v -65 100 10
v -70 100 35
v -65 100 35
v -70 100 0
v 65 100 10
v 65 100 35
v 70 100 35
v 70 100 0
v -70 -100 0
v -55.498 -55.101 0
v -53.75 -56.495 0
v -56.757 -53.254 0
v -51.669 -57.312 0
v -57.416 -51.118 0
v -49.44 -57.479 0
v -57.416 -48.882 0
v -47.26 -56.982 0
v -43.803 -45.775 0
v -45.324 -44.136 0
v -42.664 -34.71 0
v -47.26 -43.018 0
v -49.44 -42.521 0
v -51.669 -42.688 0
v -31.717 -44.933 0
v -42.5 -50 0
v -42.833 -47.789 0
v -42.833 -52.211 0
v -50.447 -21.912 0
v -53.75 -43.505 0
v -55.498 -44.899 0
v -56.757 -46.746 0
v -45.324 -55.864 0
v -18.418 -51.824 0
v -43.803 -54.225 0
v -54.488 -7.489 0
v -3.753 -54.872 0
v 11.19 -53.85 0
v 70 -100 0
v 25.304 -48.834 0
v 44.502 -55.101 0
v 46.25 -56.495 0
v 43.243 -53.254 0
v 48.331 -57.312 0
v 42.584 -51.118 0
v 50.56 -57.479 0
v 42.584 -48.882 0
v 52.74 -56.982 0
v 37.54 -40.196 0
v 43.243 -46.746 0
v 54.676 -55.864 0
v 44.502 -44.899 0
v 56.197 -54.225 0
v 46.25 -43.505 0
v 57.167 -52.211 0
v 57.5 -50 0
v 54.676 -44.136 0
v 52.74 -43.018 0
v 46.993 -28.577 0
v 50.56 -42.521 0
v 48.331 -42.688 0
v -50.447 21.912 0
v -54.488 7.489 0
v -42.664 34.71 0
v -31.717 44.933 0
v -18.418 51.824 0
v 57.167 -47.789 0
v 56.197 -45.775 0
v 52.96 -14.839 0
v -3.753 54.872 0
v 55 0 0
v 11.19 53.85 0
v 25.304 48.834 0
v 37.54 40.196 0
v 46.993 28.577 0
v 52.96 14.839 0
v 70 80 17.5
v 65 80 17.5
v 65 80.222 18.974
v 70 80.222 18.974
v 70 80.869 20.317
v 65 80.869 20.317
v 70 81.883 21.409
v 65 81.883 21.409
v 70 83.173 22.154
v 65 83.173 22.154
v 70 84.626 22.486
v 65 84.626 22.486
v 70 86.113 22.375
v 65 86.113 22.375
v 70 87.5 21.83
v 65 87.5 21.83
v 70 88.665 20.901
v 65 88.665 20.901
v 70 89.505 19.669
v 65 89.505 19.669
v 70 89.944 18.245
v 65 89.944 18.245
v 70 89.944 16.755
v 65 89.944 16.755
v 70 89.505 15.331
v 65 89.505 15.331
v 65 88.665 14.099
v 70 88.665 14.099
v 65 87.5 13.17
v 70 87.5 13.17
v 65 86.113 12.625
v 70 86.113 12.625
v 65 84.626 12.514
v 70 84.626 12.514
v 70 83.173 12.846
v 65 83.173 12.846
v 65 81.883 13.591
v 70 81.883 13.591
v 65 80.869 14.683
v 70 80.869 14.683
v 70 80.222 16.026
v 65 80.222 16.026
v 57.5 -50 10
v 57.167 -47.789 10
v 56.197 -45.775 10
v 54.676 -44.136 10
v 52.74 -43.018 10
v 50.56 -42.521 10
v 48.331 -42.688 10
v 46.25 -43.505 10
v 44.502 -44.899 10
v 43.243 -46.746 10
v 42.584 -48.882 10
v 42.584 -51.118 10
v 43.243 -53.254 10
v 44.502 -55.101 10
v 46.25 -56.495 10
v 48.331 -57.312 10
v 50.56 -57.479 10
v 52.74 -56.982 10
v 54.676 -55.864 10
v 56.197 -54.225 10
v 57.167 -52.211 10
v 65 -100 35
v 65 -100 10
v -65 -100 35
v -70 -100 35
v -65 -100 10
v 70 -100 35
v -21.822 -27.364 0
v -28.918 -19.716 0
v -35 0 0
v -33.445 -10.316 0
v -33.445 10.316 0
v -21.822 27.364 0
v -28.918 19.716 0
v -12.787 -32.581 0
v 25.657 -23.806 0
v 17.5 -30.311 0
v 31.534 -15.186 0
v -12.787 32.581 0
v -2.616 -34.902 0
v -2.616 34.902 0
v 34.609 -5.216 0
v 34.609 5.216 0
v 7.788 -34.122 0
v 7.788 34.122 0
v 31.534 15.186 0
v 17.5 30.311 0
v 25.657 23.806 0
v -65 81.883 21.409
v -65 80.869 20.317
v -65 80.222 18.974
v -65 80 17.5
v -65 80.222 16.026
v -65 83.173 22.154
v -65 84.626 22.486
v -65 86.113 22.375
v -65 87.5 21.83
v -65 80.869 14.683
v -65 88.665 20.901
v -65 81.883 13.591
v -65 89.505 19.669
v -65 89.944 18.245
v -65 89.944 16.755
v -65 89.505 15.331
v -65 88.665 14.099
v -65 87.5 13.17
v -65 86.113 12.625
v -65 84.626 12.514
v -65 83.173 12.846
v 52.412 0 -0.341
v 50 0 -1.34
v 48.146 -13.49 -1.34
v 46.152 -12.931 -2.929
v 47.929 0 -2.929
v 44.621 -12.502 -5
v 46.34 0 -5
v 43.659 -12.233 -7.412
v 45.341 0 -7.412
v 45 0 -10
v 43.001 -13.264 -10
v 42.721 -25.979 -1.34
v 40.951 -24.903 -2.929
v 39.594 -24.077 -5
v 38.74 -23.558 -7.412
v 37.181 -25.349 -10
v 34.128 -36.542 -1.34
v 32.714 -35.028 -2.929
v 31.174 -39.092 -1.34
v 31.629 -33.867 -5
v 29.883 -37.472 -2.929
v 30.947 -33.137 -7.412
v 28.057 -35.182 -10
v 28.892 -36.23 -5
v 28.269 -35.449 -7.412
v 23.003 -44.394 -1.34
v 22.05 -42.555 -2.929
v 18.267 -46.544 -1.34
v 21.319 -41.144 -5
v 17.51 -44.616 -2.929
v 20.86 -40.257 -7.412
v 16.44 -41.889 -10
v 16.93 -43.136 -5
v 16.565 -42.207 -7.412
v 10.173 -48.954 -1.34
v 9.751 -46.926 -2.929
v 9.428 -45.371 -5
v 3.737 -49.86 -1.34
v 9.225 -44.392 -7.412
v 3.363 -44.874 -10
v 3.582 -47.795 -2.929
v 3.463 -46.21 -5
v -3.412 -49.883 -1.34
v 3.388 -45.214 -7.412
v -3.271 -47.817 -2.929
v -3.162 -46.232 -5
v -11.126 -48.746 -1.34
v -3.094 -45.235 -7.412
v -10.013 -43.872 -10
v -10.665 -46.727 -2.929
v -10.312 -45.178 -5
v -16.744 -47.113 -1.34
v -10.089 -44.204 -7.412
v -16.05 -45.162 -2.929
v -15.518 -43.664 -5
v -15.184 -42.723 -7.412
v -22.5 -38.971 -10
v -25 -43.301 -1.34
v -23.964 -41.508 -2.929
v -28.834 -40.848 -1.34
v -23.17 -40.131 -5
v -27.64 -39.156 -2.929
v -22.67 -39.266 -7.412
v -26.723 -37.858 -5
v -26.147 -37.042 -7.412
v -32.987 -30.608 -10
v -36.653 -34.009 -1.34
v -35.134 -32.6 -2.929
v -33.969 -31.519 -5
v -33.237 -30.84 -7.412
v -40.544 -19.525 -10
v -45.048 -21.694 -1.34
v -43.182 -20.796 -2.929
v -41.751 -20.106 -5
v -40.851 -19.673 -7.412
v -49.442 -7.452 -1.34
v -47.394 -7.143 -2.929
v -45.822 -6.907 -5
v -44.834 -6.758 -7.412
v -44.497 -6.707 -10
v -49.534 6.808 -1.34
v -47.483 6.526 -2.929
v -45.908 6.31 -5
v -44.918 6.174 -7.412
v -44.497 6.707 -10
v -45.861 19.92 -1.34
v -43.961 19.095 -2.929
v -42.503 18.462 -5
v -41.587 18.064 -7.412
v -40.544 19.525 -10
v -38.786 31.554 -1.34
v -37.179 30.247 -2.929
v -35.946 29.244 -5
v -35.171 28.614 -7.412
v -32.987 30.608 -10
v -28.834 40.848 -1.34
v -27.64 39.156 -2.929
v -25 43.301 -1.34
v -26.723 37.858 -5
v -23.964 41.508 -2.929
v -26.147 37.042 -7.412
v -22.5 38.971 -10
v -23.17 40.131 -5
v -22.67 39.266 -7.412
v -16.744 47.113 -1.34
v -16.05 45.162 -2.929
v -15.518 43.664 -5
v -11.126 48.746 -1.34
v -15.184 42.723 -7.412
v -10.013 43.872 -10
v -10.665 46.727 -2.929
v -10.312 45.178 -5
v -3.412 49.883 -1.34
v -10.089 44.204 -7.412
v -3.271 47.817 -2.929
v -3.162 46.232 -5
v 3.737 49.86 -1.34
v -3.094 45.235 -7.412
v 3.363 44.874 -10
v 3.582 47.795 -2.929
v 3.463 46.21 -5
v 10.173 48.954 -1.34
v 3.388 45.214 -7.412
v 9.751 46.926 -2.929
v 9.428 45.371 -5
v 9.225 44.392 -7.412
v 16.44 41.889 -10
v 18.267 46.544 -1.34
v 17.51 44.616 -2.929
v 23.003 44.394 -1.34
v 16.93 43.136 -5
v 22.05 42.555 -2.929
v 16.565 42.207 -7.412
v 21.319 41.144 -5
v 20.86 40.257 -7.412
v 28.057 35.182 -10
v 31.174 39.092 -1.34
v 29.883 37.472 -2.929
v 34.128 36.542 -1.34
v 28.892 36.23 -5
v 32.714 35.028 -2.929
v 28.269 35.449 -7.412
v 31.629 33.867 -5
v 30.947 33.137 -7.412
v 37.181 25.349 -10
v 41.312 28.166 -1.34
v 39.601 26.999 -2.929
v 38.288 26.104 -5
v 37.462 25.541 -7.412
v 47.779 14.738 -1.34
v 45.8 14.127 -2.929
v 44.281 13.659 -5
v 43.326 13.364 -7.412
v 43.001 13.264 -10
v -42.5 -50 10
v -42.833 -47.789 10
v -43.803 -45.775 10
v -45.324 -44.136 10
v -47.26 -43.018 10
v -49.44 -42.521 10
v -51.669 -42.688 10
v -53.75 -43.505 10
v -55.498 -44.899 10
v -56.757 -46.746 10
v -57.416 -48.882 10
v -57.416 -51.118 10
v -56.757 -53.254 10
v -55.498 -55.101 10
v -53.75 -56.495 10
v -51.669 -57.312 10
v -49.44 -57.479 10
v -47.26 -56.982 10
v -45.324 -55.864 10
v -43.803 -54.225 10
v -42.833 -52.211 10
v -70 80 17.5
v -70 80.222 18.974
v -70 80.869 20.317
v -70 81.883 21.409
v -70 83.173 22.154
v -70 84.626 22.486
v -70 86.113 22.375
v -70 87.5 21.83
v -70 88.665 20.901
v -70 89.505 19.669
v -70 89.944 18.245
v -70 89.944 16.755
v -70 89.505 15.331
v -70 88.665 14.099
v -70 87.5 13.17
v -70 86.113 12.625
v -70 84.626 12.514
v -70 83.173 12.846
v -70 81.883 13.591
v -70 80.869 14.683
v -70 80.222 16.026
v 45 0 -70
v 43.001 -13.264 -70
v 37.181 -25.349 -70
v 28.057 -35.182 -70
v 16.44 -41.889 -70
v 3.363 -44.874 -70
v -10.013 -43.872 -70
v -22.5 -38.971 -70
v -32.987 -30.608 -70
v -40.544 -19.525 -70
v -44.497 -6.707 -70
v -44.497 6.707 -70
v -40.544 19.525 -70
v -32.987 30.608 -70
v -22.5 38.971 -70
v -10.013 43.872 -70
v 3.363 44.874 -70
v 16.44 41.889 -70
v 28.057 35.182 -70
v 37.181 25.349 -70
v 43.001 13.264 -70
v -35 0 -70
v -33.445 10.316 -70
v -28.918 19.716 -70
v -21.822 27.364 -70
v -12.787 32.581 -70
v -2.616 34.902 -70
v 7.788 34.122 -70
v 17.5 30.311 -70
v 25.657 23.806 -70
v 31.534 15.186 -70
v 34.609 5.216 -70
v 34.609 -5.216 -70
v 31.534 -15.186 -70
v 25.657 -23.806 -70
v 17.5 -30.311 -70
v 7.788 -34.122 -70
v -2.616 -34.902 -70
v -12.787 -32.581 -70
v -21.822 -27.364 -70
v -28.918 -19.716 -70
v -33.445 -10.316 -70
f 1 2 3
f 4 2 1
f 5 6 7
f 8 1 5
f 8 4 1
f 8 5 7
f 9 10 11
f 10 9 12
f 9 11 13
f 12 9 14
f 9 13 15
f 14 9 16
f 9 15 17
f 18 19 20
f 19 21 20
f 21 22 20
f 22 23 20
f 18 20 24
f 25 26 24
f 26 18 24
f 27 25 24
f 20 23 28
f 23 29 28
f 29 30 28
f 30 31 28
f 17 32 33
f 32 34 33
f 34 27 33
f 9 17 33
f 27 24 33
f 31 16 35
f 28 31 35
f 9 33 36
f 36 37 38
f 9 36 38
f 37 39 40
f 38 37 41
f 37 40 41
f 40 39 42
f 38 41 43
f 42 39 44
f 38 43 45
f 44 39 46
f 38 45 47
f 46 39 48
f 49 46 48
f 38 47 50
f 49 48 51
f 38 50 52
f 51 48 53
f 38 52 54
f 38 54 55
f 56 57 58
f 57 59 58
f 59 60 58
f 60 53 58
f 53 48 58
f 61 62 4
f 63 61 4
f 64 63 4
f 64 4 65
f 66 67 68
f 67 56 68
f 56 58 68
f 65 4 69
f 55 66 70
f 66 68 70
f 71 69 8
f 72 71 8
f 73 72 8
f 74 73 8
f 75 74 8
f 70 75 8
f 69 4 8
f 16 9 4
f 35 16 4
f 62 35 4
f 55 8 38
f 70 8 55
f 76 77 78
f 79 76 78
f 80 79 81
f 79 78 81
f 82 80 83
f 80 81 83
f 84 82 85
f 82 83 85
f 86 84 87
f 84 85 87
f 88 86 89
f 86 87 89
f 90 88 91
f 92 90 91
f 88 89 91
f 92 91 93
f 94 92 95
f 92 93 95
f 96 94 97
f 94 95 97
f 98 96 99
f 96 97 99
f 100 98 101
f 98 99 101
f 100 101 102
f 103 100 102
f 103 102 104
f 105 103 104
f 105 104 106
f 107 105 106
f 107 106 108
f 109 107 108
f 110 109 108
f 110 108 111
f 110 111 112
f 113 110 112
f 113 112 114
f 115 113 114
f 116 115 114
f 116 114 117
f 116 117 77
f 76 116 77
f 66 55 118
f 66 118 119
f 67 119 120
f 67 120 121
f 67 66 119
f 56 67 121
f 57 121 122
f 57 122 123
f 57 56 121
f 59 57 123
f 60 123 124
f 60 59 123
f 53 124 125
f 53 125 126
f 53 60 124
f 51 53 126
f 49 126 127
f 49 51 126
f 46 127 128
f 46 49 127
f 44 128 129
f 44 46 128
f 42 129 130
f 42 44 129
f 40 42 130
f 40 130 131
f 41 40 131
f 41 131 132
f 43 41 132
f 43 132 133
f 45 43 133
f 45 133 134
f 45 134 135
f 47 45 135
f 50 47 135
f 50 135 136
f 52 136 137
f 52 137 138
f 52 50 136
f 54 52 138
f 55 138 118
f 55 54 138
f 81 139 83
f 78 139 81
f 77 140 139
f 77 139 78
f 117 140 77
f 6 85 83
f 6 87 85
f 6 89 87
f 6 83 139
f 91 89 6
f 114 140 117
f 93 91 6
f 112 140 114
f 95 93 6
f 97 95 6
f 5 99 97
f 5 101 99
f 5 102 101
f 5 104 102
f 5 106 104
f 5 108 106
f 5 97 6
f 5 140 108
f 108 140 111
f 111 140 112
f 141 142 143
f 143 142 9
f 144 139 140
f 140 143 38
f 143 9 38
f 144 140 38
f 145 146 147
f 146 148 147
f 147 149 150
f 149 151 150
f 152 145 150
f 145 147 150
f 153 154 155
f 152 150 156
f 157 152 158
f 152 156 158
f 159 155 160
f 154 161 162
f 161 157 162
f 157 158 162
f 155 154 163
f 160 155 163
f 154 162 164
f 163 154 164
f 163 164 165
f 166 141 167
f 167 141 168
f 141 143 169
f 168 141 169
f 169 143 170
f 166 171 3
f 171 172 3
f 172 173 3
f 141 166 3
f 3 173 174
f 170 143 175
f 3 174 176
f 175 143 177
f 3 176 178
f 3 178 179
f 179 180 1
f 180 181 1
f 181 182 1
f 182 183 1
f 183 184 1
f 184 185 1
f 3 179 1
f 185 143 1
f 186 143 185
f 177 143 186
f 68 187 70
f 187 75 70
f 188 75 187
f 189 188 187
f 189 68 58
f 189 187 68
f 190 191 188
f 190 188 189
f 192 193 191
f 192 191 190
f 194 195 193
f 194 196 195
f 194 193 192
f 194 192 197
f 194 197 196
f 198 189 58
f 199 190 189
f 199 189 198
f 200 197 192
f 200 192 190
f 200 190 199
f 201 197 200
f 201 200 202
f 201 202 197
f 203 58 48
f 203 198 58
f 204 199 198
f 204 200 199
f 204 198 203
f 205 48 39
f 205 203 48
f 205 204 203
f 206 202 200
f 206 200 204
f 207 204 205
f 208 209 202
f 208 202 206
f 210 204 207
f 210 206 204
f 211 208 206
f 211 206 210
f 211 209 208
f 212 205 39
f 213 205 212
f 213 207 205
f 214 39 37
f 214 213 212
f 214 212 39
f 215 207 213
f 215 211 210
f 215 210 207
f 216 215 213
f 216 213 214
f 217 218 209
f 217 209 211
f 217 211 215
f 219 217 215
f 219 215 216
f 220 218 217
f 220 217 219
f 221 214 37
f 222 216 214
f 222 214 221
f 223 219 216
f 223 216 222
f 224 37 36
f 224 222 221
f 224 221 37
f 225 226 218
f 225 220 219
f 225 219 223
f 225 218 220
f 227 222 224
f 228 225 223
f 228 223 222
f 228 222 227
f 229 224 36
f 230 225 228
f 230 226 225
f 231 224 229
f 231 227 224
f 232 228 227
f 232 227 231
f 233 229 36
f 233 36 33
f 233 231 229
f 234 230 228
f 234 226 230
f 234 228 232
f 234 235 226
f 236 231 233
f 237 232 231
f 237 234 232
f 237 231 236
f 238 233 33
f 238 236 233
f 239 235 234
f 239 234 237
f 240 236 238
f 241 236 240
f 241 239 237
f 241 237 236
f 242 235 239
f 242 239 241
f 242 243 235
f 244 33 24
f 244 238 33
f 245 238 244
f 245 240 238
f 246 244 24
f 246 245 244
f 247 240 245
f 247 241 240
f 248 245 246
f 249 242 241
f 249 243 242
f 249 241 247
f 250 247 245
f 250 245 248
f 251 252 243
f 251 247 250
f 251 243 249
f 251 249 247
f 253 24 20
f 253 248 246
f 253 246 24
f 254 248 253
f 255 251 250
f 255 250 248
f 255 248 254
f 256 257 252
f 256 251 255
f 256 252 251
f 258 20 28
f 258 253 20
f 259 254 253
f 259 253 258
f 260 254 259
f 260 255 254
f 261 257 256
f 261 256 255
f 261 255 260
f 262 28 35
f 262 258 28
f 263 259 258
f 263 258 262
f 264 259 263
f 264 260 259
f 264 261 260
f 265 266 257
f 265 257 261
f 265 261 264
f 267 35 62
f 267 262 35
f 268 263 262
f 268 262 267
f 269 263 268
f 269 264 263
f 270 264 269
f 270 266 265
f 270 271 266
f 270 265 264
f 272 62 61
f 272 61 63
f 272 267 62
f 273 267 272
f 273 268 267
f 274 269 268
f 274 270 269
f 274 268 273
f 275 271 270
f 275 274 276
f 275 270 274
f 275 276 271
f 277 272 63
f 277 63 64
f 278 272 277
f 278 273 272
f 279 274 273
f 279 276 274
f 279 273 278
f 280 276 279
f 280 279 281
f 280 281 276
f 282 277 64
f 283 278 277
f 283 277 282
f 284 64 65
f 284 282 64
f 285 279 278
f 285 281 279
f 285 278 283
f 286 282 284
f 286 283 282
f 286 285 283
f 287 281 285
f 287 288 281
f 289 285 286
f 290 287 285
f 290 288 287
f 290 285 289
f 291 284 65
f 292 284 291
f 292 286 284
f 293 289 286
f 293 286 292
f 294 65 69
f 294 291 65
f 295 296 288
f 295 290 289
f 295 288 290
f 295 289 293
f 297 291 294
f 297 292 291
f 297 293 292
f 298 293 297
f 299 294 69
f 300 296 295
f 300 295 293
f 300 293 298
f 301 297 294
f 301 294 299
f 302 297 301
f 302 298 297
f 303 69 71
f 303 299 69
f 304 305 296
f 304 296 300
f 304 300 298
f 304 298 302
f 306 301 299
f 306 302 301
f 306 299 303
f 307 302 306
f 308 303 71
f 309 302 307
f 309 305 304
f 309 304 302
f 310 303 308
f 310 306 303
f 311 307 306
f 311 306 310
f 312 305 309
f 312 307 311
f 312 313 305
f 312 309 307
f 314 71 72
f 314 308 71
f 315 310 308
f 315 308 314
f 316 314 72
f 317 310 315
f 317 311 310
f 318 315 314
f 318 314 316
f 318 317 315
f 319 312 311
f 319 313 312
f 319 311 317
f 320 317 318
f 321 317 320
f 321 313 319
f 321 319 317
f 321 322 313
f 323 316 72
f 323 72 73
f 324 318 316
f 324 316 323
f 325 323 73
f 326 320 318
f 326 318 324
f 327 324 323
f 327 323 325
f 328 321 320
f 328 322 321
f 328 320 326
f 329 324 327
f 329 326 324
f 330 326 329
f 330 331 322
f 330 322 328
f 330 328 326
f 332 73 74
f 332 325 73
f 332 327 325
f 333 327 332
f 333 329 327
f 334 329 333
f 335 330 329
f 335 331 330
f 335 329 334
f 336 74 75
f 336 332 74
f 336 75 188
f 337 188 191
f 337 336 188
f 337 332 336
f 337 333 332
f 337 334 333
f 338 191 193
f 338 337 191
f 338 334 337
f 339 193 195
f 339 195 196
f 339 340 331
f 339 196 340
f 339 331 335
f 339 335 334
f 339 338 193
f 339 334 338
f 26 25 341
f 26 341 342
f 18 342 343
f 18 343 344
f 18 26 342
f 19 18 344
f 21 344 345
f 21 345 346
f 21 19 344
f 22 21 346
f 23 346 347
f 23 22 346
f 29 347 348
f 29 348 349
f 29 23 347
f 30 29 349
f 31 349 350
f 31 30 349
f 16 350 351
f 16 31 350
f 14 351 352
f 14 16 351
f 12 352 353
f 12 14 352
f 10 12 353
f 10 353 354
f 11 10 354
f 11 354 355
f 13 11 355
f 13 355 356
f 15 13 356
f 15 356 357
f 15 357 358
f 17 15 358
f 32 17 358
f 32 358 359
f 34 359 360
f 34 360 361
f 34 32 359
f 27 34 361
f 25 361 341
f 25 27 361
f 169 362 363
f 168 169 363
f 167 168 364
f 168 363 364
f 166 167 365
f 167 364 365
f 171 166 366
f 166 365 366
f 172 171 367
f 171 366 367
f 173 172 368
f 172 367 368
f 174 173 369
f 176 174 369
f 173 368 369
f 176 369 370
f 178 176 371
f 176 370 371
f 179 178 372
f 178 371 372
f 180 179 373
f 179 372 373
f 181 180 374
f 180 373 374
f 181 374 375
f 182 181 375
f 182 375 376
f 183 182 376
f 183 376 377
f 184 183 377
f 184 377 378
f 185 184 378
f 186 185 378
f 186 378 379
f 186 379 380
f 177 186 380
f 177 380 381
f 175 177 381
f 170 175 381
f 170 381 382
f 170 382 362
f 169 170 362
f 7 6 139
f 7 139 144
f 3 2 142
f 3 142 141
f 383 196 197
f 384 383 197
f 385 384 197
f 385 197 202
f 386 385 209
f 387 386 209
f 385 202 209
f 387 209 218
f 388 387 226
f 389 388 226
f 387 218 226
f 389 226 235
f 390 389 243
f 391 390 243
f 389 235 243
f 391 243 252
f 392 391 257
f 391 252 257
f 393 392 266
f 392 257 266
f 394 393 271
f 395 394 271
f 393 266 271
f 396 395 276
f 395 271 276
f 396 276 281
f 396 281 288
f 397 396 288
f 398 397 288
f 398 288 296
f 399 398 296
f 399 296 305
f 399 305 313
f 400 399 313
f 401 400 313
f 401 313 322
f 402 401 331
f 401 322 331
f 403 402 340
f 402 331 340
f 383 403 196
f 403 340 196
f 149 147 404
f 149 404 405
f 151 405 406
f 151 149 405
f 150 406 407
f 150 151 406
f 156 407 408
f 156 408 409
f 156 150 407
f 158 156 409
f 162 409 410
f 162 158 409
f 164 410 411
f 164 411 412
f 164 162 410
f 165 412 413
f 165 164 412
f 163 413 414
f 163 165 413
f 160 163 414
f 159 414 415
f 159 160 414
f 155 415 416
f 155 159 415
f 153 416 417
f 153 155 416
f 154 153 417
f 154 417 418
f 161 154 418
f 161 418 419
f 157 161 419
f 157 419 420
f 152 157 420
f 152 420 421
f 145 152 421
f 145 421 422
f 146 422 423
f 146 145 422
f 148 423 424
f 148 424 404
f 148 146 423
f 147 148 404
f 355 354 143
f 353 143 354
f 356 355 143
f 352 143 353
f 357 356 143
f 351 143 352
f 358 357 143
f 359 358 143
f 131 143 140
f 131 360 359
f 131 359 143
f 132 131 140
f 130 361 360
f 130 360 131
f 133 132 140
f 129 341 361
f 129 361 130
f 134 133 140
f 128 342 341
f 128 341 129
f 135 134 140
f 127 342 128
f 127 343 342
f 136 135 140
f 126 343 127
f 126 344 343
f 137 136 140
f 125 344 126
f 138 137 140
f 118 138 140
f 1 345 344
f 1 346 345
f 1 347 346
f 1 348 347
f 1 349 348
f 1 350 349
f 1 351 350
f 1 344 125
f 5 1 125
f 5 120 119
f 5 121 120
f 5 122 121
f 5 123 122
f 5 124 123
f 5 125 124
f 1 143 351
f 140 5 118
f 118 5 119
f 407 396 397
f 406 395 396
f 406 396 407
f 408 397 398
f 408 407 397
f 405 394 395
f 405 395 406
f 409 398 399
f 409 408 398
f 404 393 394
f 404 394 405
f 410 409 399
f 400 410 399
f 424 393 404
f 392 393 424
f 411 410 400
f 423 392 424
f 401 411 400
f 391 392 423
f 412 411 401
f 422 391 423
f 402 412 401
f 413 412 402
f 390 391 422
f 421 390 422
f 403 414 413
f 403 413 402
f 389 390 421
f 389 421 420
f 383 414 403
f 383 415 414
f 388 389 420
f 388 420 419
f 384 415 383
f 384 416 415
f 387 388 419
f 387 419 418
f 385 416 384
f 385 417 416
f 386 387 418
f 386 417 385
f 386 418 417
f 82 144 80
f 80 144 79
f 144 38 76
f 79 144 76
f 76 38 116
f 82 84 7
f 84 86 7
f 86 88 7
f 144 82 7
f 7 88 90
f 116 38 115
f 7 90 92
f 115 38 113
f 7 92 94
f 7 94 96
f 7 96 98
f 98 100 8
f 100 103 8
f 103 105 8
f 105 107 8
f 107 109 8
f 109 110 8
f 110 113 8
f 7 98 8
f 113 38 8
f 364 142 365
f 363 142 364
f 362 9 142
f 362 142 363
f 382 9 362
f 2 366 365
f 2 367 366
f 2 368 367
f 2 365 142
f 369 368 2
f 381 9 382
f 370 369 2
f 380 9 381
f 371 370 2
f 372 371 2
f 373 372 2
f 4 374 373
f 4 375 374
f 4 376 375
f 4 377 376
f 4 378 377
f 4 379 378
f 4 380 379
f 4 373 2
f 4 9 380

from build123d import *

# Parameters (mm, degrees)
SKETCH1_W           = 140
SKETCH1_H           = 200
SKETCH1_R           = 7.5
BOSS_EXTRUDE1_DEPTH = 10
SKETCH2_W           = 5
SKETCH2_H           = 200
BOSS_EXTRUDE2_DEPTH = 25
SKETCH3_R           = 5
CUT_EXTRUDE1_DEPTH  = 176.570498661
SKETCH4_R           = 45
SKETCH4_R_2         = 35
BOSS_EXTRUDE3_DEPTH = 70
FILLET1_R           = 10


with BuildPart() as part:
    # Sketch1 → Boss-Extrude1 (new body)
    with BuildSketch(Plane.XY):
        Rectangle(SKETCH1_W, SKETCH1_H)
        with Locations((-50, -50)):
            Circle(SKETCH1_R, mode=Mode.SUBTRACT)
        with Locations((50, -50)):
            Circle(SKETCH1_R, mode=Mode.SUBTRACT)
    extrude(amount=BOSS_EXTRUDE1_DEPTH)

    # Sketch2 → Boss-Extrude2 (add)
    with BuildSketch(Plane.XY.offset(10)):
        with Locations((-67.5, 0)):
            Rectangle(SKETCH2_W, SKETCH2_H)
        with Locations((67.5, 0)):
            Rectangle(SKETCH2_W, SKETCH2_H)
    extrude(amount=BOSS_EXTRUDE2_DEPTH)

    # Sketch3 → Cut-Extrude1 (cut, through all)
    with BuildSketch(Plane.ZY.offset(70)):
        with Locations(Location((17.5, 85, 0), (0, 0, 270))):
            Circle(SKETCH3_R)
    extrude(amount=-CUT_EXTRUDE1_DEPTH, mode=Mode.SUBTRACT)

    # Sketch4 → Boss-Extrude3 (add)
    with BuildSketch(Plane(origin=(0, 0, 0), x_dir=(-1, 0, 0), z_dir=(0, 0, -1))):
        with Locations(Location((0, 0, 0), (0, 0, 180))):
            Circle(SKETCH4_R)
        Circle(SKETCH4_R_2, mode=Mode.SUBTRACT)
    extrude(amount=BOSS_EXTRUDE3_DEPTH)

    # Fillet1
    fillet1_edges = [part.edges().sort_by_distance(p)[0] for p in [
        (-45, 0, 0),
    ]]
    fillet(fillet1_edges, radius=FILLET1_R)


solid = part.part
